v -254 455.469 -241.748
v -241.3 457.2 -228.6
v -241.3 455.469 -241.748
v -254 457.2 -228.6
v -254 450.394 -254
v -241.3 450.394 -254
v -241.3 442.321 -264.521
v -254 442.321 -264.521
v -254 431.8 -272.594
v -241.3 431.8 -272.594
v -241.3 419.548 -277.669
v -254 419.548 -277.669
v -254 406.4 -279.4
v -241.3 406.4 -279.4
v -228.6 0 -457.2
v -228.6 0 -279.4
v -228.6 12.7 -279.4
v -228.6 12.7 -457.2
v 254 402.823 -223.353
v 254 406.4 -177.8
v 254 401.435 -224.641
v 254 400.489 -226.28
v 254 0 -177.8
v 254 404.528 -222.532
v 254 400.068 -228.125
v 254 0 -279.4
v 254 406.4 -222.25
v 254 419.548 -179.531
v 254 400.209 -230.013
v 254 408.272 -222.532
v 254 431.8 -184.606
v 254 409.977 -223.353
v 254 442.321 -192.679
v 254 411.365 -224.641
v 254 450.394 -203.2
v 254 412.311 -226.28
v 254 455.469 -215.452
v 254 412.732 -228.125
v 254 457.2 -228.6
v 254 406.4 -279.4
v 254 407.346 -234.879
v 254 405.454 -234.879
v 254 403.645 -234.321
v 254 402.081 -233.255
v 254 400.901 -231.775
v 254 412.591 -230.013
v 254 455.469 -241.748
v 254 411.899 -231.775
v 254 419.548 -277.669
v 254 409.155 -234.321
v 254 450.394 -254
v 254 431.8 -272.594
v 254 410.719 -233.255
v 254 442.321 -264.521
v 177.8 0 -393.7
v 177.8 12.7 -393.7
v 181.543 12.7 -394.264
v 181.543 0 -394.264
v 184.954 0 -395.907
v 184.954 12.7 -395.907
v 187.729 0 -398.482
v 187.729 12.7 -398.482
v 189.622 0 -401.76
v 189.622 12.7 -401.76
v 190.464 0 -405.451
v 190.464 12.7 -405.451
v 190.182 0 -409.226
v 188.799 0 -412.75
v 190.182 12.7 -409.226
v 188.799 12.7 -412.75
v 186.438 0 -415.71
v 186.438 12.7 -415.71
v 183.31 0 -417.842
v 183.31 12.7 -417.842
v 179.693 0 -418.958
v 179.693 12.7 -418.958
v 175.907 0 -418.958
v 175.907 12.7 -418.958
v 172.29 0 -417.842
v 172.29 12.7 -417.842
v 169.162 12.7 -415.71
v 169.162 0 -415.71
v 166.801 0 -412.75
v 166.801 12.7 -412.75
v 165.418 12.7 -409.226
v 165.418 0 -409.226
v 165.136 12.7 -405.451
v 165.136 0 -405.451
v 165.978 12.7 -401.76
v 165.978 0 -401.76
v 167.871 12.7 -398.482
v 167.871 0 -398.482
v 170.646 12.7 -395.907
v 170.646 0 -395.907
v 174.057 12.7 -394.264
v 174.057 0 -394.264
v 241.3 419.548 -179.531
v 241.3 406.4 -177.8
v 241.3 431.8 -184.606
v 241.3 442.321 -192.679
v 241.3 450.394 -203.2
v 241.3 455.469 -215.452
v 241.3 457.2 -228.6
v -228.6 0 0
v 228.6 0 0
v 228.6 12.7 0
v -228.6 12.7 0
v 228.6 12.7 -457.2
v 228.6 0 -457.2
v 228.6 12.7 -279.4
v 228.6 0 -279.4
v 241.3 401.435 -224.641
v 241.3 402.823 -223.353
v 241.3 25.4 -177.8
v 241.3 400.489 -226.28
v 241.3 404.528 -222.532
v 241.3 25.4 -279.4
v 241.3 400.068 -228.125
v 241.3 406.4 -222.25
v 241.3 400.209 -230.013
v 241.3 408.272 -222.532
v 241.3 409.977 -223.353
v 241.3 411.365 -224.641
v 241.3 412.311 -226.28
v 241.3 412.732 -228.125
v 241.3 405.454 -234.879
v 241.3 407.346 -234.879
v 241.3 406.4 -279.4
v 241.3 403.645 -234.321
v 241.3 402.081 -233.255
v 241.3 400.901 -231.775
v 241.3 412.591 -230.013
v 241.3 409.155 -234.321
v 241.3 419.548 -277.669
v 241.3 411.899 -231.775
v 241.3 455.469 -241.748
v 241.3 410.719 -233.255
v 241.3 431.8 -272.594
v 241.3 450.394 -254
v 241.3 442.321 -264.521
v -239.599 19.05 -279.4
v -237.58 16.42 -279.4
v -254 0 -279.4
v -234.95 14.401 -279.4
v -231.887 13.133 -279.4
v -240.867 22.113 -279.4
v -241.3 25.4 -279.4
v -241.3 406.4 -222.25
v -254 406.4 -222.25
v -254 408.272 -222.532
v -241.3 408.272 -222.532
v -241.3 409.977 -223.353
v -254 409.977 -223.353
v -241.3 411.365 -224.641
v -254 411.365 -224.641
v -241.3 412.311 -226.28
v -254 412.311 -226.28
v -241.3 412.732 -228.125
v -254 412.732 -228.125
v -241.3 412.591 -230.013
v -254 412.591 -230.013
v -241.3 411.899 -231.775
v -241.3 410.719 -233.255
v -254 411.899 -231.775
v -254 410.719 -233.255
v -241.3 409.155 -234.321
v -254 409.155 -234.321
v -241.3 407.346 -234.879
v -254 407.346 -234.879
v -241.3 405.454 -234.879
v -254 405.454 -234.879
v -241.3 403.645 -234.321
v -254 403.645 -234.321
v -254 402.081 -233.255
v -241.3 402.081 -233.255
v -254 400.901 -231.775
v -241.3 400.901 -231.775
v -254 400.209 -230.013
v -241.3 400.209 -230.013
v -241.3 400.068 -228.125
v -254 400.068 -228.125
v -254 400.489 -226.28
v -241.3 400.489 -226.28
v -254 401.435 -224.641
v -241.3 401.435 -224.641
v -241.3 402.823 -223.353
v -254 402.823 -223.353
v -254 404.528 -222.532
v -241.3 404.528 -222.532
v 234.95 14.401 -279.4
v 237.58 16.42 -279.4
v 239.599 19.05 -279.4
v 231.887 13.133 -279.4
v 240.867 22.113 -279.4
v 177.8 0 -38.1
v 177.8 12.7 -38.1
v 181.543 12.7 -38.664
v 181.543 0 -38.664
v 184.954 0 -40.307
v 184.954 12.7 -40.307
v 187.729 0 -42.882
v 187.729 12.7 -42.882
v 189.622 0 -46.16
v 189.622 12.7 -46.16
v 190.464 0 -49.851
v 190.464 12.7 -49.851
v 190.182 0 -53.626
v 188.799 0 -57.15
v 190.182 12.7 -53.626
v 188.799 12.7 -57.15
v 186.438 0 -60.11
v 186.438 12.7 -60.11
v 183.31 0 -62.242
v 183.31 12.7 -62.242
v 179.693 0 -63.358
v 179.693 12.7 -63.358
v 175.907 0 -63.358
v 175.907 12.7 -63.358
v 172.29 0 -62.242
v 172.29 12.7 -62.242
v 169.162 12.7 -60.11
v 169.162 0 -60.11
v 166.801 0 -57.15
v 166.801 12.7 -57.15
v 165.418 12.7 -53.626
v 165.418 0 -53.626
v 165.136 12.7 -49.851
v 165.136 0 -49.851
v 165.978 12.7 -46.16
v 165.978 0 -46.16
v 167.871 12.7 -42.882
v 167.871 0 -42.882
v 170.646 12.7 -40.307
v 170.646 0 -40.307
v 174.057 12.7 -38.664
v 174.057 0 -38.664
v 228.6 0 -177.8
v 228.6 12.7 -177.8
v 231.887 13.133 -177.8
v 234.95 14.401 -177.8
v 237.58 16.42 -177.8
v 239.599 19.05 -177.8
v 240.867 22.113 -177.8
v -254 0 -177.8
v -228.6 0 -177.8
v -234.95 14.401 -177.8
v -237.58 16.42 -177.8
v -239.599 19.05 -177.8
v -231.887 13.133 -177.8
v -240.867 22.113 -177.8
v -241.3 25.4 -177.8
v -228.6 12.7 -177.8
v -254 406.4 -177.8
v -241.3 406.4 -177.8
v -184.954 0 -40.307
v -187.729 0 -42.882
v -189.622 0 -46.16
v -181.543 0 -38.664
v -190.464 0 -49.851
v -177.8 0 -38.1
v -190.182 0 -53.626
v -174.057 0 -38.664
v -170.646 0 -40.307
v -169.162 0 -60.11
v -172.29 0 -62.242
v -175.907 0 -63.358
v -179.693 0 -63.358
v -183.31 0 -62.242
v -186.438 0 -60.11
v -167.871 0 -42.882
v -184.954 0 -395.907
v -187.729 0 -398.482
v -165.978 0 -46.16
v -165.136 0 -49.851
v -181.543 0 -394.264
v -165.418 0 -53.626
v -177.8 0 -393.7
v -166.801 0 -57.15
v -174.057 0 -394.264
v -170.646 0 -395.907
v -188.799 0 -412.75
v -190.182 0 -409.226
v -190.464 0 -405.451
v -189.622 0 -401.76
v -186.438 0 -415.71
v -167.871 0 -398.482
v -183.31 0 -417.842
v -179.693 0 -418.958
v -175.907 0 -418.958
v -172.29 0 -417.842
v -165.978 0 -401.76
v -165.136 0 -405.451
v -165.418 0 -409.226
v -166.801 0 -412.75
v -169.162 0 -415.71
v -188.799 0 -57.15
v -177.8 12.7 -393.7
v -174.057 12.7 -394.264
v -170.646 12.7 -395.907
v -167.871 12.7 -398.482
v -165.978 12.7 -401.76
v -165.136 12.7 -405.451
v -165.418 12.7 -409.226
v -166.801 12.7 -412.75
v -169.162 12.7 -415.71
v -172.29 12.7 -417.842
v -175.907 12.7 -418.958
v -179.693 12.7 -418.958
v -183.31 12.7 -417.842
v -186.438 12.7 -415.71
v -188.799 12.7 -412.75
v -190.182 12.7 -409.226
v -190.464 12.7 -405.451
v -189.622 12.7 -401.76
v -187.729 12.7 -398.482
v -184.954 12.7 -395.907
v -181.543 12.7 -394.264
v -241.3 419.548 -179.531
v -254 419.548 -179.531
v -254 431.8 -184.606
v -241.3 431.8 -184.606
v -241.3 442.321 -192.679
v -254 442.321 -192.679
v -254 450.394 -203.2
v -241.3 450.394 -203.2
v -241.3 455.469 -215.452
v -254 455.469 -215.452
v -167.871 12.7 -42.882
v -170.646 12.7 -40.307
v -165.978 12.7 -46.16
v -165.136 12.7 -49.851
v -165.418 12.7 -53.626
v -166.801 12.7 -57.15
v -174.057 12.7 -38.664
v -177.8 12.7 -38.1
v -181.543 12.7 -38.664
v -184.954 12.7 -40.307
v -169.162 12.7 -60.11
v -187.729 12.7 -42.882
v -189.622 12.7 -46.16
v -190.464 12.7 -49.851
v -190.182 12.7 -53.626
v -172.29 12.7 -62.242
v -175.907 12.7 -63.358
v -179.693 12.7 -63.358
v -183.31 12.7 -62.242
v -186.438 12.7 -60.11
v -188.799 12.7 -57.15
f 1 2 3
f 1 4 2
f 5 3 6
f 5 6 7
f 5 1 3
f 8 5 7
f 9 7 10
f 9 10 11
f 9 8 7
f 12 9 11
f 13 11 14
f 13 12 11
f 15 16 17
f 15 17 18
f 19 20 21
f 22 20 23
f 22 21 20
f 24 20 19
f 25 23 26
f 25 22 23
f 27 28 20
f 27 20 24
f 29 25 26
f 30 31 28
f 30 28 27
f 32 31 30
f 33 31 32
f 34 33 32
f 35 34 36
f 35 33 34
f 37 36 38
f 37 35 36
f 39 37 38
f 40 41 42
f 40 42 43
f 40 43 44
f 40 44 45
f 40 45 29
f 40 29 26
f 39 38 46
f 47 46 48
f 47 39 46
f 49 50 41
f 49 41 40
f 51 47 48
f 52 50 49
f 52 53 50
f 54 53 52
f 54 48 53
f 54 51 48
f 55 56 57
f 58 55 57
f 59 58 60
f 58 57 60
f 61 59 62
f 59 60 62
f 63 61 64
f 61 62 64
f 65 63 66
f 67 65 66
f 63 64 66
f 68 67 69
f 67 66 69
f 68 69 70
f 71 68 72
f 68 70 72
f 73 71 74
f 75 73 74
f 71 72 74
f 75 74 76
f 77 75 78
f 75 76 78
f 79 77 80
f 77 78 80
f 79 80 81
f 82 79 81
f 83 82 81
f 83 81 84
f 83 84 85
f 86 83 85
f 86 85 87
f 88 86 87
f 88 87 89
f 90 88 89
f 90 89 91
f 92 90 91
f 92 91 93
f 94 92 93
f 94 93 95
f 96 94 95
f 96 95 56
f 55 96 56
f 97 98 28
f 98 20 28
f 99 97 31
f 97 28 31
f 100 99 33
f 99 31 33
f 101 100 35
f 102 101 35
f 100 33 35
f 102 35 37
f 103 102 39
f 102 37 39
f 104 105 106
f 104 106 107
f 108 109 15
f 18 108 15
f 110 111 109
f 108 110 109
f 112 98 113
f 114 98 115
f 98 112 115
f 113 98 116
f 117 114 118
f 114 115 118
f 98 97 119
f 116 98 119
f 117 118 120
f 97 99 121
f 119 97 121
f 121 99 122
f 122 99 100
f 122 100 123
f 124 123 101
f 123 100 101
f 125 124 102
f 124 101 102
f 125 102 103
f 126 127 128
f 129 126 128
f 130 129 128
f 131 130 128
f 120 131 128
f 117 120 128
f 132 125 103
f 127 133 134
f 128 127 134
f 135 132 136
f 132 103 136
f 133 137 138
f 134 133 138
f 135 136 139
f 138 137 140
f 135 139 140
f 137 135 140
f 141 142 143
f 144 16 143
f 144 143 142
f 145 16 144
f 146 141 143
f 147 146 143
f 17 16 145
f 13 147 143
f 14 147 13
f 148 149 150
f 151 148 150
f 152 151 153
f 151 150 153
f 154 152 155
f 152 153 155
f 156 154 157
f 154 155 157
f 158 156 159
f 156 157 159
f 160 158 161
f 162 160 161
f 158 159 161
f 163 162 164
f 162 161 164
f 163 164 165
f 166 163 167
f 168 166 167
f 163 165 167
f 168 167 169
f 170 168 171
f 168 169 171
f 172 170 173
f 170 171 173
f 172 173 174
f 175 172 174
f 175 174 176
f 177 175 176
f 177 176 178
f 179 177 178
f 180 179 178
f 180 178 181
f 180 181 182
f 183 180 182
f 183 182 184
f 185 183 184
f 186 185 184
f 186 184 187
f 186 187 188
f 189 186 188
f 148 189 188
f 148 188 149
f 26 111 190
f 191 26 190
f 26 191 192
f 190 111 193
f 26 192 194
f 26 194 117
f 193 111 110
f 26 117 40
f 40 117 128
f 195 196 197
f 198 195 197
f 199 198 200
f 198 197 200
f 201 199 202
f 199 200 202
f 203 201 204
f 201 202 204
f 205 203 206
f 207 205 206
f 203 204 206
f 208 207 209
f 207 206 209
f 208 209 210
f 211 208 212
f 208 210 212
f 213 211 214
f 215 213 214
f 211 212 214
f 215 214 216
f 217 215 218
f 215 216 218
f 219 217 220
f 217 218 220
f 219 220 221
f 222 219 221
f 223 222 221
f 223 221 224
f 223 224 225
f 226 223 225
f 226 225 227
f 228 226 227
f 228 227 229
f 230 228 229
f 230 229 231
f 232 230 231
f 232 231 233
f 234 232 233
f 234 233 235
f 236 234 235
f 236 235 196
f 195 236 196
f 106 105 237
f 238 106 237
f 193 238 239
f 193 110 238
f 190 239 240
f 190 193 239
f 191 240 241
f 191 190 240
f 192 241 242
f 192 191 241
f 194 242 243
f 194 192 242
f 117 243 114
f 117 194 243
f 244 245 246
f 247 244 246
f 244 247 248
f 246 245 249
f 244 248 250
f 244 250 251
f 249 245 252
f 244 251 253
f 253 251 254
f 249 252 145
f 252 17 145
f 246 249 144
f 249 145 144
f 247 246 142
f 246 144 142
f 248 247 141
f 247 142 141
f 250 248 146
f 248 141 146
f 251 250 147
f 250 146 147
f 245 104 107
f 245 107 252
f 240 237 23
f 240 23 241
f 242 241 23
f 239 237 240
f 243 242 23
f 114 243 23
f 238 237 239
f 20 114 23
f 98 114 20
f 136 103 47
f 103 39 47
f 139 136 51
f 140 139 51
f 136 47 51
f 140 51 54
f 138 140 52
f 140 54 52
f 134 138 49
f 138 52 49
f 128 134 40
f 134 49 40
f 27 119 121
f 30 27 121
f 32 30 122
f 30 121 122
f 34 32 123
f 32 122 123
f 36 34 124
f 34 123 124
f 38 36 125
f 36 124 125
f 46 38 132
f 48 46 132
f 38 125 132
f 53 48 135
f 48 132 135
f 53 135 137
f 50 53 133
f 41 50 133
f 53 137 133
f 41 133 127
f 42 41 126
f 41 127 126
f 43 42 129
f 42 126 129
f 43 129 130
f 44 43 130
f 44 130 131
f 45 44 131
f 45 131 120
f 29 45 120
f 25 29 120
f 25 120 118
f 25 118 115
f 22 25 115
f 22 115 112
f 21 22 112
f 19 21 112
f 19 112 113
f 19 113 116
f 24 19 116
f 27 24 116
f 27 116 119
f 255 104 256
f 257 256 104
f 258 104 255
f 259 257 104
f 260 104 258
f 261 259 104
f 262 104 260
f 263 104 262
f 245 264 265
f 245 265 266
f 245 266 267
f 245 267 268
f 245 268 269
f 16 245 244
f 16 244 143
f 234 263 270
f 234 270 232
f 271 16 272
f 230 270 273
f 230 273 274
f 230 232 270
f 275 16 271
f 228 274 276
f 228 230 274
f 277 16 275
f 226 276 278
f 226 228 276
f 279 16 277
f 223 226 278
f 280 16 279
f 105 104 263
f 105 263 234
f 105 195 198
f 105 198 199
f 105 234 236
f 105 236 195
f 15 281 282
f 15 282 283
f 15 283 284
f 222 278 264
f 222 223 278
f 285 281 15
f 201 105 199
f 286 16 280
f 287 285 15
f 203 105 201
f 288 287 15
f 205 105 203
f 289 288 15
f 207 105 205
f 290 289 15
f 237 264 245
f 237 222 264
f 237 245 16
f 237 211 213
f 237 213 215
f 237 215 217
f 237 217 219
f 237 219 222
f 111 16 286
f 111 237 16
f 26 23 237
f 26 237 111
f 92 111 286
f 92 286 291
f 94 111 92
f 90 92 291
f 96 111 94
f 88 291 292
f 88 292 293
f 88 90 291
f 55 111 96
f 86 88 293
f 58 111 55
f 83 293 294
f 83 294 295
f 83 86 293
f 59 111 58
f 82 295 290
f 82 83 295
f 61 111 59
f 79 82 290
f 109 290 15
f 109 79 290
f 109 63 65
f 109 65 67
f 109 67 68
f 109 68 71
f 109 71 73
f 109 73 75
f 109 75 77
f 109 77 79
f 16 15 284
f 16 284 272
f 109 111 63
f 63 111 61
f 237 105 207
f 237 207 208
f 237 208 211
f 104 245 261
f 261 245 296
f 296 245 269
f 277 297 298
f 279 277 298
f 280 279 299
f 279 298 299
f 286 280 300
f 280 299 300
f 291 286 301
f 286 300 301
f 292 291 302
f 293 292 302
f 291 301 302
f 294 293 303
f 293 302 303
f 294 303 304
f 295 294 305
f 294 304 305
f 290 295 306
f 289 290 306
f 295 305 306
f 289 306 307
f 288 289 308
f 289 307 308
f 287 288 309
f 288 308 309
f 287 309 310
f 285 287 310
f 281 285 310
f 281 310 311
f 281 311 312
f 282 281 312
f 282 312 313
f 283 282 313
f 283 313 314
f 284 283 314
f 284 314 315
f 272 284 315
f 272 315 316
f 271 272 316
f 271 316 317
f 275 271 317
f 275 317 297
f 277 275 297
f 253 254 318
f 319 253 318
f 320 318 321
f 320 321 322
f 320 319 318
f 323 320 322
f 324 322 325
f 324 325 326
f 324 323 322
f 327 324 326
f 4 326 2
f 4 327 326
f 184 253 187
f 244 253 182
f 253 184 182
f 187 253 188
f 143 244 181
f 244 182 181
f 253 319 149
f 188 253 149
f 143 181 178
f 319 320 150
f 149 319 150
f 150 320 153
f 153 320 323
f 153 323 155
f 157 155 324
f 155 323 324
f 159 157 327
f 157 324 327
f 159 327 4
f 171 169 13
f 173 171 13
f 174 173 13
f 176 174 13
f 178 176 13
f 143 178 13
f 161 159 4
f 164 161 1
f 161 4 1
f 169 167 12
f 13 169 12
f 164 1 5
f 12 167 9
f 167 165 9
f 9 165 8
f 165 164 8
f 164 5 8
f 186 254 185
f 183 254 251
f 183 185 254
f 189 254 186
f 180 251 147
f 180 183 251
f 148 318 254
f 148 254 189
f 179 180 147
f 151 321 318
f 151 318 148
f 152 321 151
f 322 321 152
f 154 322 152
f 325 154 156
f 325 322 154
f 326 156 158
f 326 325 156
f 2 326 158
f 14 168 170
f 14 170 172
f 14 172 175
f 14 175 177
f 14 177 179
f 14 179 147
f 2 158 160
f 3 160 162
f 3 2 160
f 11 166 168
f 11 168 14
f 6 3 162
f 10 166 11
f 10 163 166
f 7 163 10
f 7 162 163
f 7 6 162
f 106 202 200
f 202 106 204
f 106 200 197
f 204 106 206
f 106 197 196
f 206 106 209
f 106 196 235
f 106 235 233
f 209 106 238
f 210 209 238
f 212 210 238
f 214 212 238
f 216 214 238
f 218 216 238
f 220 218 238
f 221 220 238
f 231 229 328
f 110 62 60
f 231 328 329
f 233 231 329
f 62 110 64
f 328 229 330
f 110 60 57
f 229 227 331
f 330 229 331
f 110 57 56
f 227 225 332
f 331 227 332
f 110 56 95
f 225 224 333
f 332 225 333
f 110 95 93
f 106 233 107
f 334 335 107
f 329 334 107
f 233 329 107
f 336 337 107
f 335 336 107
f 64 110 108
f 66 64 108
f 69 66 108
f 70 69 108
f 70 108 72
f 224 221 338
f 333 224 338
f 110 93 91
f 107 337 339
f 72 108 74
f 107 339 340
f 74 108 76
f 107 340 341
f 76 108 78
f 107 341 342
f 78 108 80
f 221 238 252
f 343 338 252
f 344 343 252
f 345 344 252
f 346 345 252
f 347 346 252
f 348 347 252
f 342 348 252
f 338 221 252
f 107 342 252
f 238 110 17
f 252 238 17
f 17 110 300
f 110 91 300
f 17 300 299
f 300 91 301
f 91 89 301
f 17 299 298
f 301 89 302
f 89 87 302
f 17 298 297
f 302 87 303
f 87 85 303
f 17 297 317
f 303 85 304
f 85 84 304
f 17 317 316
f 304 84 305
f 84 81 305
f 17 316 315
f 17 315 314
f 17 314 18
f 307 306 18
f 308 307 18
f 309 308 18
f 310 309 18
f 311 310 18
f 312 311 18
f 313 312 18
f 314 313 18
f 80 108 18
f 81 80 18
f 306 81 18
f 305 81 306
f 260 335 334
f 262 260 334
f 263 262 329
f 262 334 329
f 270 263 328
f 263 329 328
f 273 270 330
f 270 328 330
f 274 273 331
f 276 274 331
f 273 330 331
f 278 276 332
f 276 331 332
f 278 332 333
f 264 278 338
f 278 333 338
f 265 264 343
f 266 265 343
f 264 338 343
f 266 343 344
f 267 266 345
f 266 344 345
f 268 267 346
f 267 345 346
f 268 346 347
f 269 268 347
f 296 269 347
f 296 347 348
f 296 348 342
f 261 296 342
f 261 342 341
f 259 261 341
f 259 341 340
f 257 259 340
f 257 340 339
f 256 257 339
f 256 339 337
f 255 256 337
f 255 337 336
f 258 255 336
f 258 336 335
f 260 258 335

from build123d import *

# Parameters (mm, degrees)
SKETCH1_W            = 228.6
SKETCH1_H            = 457.2
BOSS_EXTRUDE1_DEPTH  = 12.7
SKETCH2_W            = 12.7
SKETCH2_H            = 101.6
BOSS_EXTRUDE2_DEPTH  = 12.7
SKETCH3_W            = 101.6
SKETCH3_H            = 457.2
BOSS_EXTRUDE3_DEPTH  = 12.7
FILLET1_R            = 12.7
FILLET1_OF_MIRROR1_R = 12.7
SKETCH4_R            = 6.35
CUT_EXTRUDE1_DEPTH   = 823.269834057
FILLET2_R            = 50.8
FILLET3_R            = 50.8
FILLET4_R            = 50.8
FILLET5_R            = 50.8
SKETCH5_R            = 12.7
CUT_EXTRUDE2_DEPTH   = 687.387711137
SKETCH6_R            = 12.7
CUT_EXTRUDE3_DEPTH   = 687.387711137


with BuildPart() as part:
    # Sketch1 → Boss-Extrude1 (new body)
    with BuildSketch(Plane(origin=(0, 0, 0), x_dir=(1, 0, 0), z_dir=(0, 1, 0))):
        with Locations((114.3, 228.6)):
            Rectangle(SKETCH1_W, SKETCH1_H)
    boss_extrude1 = extrude(amount=BOSS_EXTRUDE1_DEPTH)

    # Sketch2 → Boss-Extrude2 (add)
    with BuildSketch(Plane(origin=(0, 12.7, 0), x_dir=(1, 0, 0), z_dir=(0, 1, 0))):
        with Locations((234.95, 228.6)):
            Rectangle(SKETCH2_W, SKETCH2_H)
    boss_extrude2 = extrude(amount=-BOSS_EXTRUDE2_DEPTH)

    # Sketch3 → Boss-Extrude3 (add)
    with BuildSketch(Plane(origin=(241.3, 0, 0), x_dir=(0, 0, -1), z_dir=(1, 0, 0))):
        with Locations((228.6, 228.6)):
            Rectangle(SKETCH3_W, SKETCH3_H)
    boss_extrude3 = extrude(amount=BOSS_EXTRUDE3_DEPTH)

    # Fillet1
    fillet1_edges = [part.edges().sort_by_distance(p)[0] for p in [
        (241.3, 12.7, -228.6),
    ]]
    fillet(fillet1_edges, radius=FILLET1_R)

    # Mirror1: Boss-Extrude1, Boss-Extrude2, Boss-Extrude3 across plane
    add(boss_extrude1.mirror(Plane(origin=(0, 12.7, 0), x_dir=(0, 0, 1), z_dir=(1, 0, 0))))
    add(boss_extrude2.mirror(Plane(origin=(0, 12.7, 0), x_dir=(0, 0, 1), z_dir=(1, 0, 0))))
    add(boss_extrude3.mirror(Plane(origin=(0, 12.7, 0), x_dir=(0, 0, 1), z_dir=(1, 0, 0))))

    # Fillet1 of Mirror1
    fillet1_of_mirror1_edges = [part.edges().sort_by_distance(p)[0] for p in [
        (-241.3, 12.7, -228.6),
    ]]
    fillet(fillet1_of_mirror1_edges, radius=FILLET1_OF_MIRROR1_R)

    # Sketch4 → Cut-Extrude1 (cut, through all)
    with BuildSketch(Plane.ZY.offset(254)):
        with Locations((-228.6, 406.4)):
            Circle(SKETCH4_R)
    extrude(amount=-CUT_EXTRUDE1_DEPTH, mode=Mode.SUBTRACT)

    # Fillet2
    fillet2_edges = [part.edges().sort_by_distance(p)[0] for p in [
        (-247.65, 457.2, -177.8),
    ]]
    fillet(fillet2_edges, radius=FILLET2_R)

    # Fillet3
    fillet3_edges = [part.edges().sort_by_distance(p)[0] for p in [
        (-247.65, 457.2, -279.4),
    ]]
    fillet(fillet3_edges, radius=FILLET3_R - 0.0001)  # a hair under: the kernel refuses the full size

    # Fillet4
    fillet4_edges = [part.edges().sort_by_distance(p)[0] for p in [
        (247.65, 457.2, -177.8),
    ]]
    fillet(fillet4_edges, radius=FILLET4_R)

    # Fillet5
    fillet5_edges = [part.edges().sort_by_distance(p)[0] for p in [
        (247.65, 457.2, -279.4),
    ]]
    fillet(fillet5_edges, radius=FILLET5_R - 0.0001)  # a hair under: the kernel refuses the full size

    # Sketch5 → Cut-Extrude2 (cut, through all)
    with BuildSketch(Plane(origin=(0, 12.7, 0), x_dir=(1, 0, 0), z_dir=(0, 1, 0))):
        with Locations(Location((-177.8, 406.4, 0), (0, 0, 270))):
            Circle(SKETCH5_R)
    extrude(amount=-CUT_EXTRUDE2_DEPTH, mode=Mode.SUBTRACT)

    # Sketch6 → Cut-Extrude3 (cut, through all)
    with BuildSketch(Plane(origin=(0, 12.7, 0), x_dir=(1, 0, 0), z_dir=(0, 1, 0))):
        with Locations(Location((177.8, 406.4, 0), (0, 0, 270))):
            Circle(SKETCH6_R)
        with Locations(Location((-177.8, 50.8, 0), (0, 0, 270))):
            Circle(SKETCH6_R)
        with Locations(Location((177.8, 50.8, 0), (0, 0, 270))):
            Circle(SKETCH6_R)
    extrude(amount=-CUT_EXTRUDE3_DEPTH, mode=Mode.SUBTRACT)


solid = part.part
